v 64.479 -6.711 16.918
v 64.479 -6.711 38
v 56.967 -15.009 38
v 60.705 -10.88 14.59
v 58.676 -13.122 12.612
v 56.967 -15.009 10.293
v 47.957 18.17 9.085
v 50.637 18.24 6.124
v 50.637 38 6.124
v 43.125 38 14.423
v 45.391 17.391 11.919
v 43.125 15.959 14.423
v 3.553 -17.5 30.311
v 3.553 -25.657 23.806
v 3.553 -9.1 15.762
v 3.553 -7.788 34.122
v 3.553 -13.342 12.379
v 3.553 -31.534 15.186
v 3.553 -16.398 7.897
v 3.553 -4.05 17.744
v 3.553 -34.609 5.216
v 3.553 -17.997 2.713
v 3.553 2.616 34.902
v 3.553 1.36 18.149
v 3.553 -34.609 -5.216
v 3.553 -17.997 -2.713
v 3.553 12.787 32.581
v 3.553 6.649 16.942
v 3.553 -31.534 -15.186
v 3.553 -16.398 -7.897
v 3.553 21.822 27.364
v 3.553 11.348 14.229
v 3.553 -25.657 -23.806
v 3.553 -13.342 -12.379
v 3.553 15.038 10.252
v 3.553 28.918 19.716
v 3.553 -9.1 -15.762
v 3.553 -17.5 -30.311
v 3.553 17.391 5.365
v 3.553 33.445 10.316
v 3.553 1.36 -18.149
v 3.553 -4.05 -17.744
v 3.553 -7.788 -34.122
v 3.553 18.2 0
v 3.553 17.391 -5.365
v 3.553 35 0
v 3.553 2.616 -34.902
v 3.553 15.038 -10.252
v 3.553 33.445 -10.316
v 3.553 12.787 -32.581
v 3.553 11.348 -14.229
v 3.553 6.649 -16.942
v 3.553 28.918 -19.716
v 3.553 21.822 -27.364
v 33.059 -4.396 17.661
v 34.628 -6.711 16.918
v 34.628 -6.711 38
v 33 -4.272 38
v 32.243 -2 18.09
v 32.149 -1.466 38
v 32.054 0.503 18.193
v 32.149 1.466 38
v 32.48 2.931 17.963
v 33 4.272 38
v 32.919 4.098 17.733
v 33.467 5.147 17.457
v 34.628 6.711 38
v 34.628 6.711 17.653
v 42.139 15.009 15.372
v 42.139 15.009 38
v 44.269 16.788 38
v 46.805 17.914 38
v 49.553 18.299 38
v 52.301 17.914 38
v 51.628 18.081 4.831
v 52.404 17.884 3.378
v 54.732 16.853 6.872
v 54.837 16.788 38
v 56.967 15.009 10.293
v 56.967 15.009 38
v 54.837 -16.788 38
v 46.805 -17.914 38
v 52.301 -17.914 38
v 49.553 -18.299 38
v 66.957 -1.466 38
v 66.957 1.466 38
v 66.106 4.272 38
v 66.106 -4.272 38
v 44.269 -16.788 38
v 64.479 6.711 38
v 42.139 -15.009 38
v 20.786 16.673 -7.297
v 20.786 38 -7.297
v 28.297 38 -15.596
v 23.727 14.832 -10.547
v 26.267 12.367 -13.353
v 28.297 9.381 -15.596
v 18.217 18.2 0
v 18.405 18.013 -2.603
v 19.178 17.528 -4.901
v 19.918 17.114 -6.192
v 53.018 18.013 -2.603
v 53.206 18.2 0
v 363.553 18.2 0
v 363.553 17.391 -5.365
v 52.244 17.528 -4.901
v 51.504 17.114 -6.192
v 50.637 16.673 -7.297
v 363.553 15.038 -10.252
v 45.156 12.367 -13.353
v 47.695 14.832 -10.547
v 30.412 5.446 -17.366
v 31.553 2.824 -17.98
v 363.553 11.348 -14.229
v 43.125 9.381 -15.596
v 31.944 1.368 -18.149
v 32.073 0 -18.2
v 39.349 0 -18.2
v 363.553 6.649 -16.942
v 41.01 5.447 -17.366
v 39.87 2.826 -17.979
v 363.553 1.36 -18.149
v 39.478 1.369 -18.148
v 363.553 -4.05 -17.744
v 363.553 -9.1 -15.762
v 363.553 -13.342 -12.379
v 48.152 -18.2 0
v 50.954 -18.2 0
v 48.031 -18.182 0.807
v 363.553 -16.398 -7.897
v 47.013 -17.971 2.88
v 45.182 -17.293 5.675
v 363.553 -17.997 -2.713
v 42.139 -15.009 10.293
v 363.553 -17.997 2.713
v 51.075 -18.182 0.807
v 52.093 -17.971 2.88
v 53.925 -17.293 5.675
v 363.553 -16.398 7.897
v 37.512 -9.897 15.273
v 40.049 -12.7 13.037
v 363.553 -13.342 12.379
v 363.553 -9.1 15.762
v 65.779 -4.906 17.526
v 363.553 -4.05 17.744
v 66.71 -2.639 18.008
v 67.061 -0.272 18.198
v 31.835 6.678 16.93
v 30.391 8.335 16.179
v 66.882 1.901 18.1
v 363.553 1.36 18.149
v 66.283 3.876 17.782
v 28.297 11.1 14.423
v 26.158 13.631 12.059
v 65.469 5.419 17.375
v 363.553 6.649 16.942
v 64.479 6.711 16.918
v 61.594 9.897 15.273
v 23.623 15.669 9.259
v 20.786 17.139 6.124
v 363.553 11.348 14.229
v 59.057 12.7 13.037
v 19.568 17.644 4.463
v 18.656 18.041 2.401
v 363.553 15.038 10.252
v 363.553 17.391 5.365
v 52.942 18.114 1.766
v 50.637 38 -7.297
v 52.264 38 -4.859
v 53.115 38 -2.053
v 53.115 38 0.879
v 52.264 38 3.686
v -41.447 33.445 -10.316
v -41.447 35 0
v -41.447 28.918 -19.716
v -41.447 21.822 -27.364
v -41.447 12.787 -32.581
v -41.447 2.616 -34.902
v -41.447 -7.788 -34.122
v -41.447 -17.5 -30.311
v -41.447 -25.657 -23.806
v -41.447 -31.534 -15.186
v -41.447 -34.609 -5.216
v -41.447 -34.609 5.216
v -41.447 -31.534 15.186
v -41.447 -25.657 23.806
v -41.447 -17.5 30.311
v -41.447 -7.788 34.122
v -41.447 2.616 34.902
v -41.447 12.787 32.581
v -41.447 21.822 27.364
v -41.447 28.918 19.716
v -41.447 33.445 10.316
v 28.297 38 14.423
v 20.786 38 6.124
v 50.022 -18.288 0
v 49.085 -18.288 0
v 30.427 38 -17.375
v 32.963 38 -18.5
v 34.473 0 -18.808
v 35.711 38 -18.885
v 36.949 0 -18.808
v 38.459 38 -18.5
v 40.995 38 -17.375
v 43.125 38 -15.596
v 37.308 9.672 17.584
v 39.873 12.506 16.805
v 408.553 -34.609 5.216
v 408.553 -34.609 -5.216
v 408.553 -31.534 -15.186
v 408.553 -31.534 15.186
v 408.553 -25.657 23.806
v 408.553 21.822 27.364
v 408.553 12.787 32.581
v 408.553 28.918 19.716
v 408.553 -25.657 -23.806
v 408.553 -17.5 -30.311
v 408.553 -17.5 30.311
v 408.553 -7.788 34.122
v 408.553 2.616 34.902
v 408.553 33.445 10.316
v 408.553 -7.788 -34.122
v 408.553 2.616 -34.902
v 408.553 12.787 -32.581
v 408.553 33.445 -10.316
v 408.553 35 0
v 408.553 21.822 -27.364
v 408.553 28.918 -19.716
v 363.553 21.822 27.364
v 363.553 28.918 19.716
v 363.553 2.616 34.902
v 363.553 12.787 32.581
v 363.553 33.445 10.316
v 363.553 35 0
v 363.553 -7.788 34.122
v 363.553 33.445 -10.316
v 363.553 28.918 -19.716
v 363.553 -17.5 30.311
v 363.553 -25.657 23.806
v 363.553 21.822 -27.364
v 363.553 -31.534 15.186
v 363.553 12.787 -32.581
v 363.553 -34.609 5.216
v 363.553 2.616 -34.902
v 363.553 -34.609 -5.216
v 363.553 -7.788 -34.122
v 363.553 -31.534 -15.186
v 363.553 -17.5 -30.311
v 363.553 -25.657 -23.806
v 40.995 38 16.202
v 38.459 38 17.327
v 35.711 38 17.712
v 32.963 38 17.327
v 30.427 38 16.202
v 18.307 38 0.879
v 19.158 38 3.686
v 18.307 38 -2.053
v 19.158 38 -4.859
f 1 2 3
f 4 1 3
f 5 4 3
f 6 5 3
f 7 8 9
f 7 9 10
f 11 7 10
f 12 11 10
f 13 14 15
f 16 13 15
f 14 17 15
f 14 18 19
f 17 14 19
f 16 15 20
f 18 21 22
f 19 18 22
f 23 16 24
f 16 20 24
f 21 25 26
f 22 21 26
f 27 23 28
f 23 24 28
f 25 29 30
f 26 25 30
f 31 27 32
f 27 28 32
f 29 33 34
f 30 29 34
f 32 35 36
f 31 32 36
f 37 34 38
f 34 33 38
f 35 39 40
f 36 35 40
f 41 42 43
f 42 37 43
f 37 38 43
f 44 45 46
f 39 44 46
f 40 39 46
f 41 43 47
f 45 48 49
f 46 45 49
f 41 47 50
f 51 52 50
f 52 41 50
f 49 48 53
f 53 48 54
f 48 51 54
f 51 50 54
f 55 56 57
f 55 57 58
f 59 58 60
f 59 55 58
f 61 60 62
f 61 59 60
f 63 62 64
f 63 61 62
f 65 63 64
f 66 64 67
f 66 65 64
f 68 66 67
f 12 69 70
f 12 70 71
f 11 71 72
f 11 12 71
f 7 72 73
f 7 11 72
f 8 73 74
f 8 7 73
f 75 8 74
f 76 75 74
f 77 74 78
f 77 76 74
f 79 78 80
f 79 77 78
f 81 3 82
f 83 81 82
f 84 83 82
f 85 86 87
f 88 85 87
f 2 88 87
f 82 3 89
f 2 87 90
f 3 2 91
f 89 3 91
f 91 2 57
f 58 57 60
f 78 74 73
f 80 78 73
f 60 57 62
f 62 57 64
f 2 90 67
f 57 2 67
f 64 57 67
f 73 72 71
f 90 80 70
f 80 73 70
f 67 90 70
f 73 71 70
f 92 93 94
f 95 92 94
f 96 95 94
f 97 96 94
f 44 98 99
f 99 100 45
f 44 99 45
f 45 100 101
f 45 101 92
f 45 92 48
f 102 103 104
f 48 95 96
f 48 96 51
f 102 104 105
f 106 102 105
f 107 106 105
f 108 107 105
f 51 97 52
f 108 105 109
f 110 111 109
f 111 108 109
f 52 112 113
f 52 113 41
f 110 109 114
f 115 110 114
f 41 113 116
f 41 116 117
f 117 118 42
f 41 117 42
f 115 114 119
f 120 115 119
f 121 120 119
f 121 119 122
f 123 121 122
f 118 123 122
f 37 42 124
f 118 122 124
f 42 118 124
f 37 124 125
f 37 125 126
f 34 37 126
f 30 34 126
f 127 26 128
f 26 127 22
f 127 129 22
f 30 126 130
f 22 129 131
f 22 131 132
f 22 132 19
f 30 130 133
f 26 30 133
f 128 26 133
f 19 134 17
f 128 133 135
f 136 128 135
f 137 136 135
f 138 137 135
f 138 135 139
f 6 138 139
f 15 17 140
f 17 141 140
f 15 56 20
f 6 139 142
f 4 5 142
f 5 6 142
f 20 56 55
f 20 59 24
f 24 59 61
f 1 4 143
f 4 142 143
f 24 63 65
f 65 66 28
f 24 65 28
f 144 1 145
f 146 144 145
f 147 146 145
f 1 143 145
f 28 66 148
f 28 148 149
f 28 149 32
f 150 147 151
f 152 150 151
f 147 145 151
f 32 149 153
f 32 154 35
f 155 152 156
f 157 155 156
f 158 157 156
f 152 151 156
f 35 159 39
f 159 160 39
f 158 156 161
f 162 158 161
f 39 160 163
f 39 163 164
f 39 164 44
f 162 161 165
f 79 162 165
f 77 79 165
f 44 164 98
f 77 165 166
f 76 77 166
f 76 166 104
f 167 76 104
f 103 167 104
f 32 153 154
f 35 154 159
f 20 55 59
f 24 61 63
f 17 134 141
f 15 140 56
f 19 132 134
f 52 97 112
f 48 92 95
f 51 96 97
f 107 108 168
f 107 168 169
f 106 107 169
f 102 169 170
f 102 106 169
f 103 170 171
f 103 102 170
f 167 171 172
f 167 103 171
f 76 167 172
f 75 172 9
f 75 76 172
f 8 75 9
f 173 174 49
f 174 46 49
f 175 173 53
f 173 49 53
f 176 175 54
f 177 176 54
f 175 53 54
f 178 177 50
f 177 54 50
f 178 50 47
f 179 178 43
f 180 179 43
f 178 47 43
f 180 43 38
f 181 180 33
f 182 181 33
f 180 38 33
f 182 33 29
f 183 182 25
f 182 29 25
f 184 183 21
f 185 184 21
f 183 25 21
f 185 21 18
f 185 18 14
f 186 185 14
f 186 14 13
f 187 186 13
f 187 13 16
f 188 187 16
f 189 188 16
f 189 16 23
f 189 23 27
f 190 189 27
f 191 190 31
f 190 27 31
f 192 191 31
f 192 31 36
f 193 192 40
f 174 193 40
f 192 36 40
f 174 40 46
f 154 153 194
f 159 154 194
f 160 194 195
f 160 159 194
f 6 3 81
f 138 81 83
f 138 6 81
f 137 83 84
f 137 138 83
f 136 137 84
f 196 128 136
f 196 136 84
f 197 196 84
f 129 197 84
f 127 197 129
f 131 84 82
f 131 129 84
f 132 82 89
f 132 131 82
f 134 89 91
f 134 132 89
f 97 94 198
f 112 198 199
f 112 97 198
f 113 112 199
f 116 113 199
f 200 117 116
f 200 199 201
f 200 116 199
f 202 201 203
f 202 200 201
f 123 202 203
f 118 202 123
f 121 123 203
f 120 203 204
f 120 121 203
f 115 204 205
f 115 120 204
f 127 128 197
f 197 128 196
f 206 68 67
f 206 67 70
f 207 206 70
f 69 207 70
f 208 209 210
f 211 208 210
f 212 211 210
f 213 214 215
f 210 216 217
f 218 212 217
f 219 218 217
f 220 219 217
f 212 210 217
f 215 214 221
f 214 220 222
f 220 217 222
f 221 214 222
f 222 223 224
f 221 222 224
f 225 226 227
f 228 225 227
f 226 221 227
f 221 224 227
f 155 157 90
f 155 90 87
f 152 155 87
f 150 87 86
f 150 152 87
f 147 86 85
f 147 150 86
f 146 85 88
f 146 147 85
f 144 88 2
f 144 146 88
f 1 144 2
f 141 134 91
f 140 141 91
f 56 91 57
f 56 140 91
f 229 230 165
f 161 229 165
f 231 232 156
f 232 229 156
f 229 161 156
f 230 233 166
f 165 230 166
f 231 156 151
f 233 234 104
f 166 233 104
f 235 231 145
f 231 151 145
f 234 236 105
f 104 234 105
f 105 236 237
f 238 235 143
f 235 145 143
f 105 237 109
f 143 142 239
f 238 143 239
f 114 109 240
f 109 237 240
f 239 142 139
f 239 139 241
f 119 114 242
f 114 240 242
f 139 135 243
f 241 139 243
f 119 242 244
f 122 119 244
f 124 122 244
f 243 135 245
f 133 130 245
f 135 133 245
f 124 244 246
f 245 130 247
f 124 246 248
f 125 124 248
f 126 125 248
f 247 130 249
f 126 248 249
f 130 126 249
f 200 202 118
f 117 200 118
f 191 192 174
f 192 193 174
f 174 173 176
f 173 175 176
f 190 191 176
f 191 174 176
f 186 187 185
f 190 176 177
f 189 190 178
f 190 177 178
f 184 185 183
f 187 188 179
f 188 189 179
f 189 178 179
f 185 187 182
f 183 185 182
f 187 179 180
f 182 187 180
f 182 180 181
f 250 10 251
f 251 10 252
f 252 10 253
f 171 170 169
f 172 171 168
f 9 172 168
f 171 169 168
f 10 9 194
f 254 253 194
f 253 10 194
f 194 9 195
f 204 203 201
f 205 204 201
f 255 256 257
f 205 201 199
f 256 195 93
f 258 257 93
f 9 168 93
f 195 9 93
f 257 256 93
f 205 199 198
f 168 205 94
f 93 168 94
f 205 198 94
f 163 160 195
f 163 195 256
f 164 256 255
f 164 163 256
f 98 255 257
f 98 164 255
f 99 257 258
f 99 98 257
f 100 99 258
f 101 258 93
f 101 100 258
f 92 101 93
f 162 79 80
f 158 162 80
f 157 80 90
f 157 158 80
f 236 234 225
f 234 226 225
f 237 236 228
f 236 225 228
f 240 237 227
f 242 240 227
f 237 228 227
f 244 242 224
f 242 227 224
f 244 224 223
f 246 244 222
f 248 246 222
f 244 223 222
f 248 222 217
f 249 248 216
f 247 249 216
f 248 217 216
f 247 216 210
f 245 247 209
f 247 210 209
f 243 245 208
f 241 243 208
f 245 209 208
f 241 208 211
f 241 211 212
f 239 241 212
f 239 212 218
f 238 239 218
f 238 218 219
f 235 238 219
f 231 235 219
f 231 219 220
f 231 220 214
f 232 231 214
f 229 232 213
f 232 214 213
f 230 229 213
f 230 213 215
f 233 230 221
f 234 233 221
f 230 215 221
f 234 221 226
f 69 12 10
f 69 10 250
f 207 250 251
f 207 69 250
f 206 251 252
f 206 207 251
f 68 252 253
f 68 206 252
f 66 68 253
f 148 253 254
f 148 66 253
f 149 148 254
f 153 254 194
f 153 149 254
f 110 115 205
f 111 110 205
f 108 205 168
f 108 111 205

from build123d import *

# Parameters (mm, degrees)
BOSS_EXTRUDE1_DEPTH = 38
BOSS_EXTRUDE2_DEPTH = 38


with BuildPart() as part:
    # Sketch1 → Revolve1 (revolve)
    with BuildSketch(Plane.XY):
        Polygon((-41.446882046, 0), (-41.446882046, 35), (3.553117954, 35), (3.553117954, 18.2), (363.553117954, 18.2), (363.553117954, 35), (408.553117954, 35), (408.553117954, 0), align=None)
    revolve(axis=Axis((408.553117954, 0, 0), (-1, 0, 0)))

    # Sketch2 → Boss-Extrude1 (add)
    with BuildSketch(Plane.XY):
        with BuildLine():
            Line((34.62755495, 6.710806587), (42.139274487, 15.00946817))
            ThreePointArc((42.139274487, 15.00946817), (49.553117954, 18.298661583), (56.966961421, 15.00946817))
            Line((56.966961421, 15.00946817), (64.478680957, 6.710806587))
            ThreePointArc((64.478680957, 6.710806587), (67.06483749, 0), (64.478680957, -6.710806587))
            Line((64.478680957, -6.710806587), (56.966961421, -15.00946817))
            ThreePointArc((56.966961421, -15.00946817), (49.553117954, -18.298661583), (42.139274487, -15.00946817))
            Line((42.139274487, -15.00946817), (34.62755495, -6.710806587))
            ThreePointArc((34.62755495, -6.710806587), (32.041398417, 0), (34.62755495, 6.710806587))
        make_face()
    extrude(amount=BOSS_EXTRUDE1_DEPTH)

    # Sketch4 → Boss-Extrude2 (add)
    with BuildSketch(Plane(origin=(0, 0, 0), x_dir=(1, 0, 0), z_dir=(0, 1, 0))):
        with BuildLine():
            Line((20.785581303, 7.29733528), (28.297300839, 15.595996863))
            ThreePointArc((28.297300839, 15.595996863), (35.711144306, 18.885190277), (43.124987774, 15.595996863))
            Line((43.124987774, 15.595996863), (50.63670731, 7.29733528))
            ThreePointArc((50.63670731, 7.29733528), (53.222863843, 0.586528694), (50.63670731, -6.124277893))
            Line((50.63670731, -6.124277893), (43.124987774, -14.422939476))
            ThreePointArc((43.124987774, -14.422939476), (35.711144306, -17.712132889), (28.297300839, -14.422939476))
            Line((28.297300839, -14.422939476), (20.785581303, -6.124277893))
            ThreePointArc((20.785581303, -6.124277893), (18.19942477, 0.586528694), (20.785581303, 7.29733528))
        make_face()
    extrude(amount=BOSS_EXTRUDE2_DEPTH)


solid = part.part
